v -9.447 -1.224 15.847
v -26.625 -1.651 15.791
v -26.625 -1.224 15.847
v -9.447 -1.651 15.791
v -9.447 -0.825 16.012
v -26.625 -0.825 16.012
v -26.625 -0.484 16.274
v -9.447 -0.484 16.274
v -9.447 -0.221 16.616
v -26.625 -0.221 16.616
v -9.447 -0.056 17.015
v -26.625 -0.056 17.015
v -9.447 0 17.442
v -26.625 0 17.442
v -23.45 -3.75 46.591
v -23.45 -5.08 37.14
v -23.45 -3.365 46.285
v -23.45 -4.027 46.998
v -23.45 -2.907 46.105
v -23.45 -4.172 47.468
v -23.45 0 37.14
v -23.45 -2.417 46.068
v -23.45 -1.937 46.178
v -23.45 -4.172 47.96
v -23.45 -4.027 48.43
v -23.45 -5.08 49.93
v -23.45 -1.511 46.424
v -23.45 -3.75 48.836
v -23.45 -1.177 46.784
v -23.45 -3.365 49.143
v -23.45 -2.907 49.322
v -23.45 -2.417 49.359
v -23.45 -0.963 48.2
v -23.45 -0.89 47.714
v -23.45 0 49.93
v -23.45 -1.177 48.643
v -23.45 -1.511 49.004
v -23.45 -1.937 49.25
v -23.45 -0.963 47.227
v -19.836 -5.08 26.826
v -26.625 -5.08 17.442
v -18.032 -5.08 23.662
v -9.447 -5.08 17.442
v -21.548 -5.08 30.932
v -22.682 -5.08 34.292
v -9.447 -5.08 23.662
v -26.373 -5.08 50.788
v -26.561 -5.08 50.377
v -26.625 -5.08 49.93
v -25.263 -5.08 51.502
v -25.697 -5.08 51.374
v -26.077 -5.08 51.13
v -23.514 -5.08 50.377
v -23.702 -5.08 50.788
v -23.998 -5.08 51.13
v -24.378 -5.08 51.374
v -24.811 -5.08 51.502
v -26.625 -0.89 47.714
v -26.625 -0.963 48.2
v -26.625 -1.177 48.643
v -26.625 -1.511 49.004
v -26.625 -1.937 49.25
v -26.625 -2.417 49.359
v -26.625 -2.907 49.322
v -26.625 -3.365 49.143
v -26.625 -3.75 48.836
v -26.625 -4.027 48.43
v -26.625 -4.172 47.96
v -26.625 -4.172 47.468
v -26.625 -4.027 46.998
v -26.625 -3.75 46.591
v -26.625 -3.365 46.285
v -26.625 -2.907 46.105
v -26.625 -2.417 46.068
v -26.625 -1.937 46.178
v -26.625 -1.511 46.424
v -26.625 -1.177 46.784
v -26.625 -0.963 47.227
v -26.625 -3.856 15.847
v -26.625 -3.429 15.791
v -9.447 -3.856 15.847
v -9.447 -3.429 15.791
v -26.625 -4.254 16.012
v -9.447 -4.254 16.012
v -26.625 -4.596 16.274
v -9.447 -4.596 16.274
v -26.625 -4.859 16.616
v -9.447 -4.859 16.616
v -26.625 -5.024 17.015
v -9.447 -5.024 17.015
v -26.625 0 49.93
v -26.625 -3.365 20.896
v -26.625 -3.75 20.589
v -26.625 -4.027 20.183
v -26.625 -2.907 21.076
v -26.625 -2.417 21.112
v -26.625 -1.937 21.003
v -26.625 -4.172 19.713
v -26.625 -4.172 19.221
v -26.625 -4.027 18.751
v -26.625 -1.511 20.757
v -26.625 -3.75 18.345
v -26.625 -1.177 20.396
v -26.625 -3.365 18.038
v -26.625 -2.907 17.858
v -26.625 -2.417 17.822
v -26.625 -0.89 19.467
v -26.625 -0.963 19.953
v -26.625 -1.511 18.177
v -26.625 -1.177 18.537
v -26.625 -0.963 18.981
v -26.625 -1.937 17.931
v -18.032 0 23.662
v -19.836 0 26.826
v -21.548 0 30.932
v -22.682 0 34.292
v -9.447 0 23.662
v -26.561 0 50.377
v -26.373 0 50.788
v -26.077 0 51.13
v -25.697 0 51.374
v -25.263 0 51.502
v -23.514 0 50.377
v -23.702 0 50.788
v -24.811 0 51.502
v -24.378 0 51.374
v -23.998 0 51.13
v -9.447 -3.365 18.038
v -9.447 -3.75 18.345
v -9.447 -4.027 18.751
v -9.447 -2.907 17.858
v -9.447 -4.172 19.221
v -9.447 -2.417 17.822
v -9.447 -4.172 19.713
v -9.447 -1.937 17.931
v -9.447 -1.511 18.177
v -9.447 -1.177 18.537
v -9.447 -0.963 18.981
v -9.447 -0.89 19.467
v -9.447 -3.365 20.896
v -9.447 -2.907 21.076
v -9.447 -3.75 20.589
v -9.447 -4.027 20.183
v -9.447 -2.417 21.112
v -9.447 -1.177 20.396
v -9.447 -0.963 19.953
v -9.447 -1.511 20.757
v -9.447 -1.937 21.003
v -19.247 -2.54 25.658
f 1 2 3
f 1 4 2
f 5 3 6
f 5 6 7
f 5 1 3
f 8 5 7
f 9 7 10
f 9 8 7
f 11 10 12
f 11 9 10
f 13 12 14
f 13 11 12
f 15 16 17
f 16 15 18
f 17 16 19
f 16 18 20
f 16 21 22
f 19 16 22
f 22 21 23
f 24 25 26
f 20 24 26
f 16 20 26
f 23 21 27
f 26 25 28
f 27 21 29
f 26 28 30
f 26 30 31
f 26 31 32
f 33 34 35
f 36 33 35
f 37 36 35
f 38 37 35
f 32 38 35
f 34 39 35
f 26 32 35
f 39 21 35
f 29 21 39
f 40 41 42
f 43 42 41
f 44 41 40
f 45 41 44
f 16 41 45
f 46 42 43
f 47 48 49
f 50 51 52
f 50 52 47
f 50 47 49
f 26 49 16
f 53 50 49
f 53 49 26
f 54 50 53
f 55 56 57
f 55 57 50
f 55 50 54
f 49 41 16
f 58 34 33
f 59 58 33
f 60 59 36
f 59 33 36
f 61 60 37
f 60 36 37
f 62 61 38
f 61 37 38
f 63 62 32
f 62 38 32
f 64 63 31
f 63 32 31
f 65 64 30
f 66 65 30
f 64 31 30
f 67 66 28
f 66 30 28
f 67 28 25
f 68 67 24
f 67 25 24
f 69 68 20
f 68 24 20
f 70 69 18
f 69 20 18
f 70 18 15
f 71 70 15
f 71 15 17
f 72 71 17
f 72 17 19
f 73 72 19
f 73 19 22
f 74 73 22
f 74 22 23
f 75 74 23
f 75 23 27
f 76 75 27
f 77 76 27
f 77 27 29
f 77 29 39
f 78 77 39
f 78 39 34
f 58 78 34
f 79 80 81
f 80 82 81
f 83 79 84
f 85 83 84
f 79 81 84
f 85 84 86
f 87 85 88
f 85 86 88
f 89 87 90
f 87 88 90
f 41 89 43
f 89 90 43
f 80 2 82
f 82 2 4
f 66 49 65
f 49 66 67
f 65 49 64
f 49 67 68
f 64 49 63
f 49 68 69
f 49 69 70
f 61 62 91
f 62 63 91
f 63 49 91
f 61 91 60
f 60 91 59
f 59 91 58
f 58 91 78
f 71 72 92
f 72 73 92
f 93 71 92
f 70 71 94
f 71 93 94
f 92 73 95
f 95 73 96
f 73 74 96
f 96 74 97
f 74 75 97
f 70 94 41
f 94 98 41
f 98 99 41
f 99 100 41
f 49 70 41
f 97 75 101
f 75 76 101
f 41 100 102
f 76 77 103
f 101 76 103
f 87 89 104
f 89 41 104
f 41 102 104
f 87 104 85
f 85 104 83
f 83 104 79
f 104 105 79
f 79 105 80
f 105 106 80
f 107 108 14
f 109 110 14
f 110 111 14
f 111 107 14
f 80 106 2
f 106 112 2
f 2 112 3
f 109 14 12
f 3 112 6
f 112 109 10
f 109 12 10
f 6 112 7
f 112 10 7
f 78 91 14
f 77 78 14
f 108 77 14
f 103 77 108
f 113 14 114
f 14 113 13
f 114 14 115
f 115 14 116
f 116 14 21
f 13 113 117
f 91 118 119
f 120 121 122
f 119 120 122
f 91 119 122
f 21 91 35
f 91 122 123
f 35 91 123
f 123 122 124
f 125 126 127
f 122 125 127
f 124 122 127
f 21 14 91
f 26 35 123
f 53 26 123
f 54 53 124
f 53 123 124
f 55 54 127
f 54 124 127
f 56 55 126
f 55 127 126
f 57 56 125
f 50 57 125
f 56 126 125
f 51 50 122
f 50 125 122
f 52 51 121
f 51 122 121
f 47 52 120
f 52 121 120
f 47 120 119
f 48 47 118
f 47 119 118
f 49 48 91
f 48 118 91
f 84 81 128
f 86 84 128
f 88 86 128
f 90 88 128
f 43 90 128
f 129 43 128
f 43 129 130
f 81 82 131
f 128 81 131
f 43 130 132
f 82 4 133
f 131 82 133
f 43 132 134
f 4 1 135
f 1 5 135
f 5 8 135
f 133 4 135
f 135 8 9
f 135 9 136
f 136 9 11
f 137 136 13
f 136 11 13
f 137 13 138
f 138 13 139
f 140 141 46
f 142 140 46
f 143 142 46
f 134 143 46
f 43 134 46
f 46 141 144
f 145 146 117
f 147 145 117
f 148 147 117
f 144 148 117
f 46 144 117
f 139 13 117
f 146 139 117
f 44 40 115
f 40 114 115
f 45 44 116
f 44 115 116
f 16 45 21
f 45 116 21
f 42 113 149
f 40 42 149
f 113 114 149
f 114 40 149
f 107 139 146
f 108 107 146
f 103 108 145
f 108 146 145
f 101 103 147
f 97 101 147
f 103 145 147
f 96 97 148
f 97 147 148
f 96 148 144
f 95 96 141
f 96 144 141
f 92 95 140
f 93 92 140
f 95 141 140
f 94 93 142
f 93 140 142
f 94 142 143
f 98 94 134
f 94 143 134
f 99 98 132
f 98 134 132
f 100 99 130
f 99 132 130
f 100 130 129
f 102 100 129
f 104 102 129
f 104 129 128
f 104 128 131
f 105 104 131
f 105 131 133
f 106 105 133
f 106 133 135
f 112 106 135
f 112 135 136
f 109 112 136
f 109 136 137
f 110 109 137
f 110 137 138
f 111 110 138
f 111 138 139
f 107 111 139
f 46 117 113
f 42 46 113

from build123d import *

# Parameters (mm, degrees)
F1_DEPTH = 5.08
F2_R     = 1.651
F4_D     = 3.3


with BuildPart() as f1:
    # F0 (on Front) → F1 (new body)
    with BuildSketch(Plane.XZ):
        with BuildLine():
            Line((-26.6248177087, 44.2240222495), (-26.6248177087, 37.1401777957))
            Line((-26.6248177087, 37.1401777957), (-26.6248177087, 15.790813717))
            Line((-26.6248177087, 15.790813717), (-18.0322819572, 15.790813717))
            Line((-18.0322819572, 15.790813717), (-9.4473101199, 15.790813717))
            Line((-9.4473101199, 15.790813717), (-9.4473101199, 23.6617988805))
            Line((-9.4473101199, 23.6617988805), (-16.3273841628, 23.6617988805))
            add(Edge.make_bspline(
                [(-16.3273841628, 23.6617988805), (-16.2021531976, 23.1573319897), (-16.1372444387, 22.7565283285), (-16.1473177087, 22.4913693964)],
                knots=[0.9536770063, 0.9536770063, 0.9536770063, 0.9536770063, 1, 1, 1, 1], degree=3))
            add(Edge.make_bspline(
                [(-16.1473177087, 22.4913693964), (-16.1800367938, 21.6301041251), (-17.0038324761, 22.1999200382), (-18.0322819572, 23.6617988805)],
                knots=[0, 0, 0, 0, 0.1504621604, 0.1504621604, 0.1504621604, 0.1504621604], degree=3))
            add(Edge.make_bspline(
                [(-18.0322819572, 23.6617988805), (-18.4185584968, 24.2108676593), (-20.6372456091, 27.8178237541), (-22.7930713687, 34.2033705284), (-23.4498177087, 37.1401777957)],
                knots=[0.1504621604, 0.1504621604, 0.1504621604, 0.1504621604, 0.2069744186, 0.4524830891, 0.4524830891, 0.4524830891, 0.4524830891], degree=3))
            add(Edge.make_bspline(
                [(-23.4498177087, 37.1401777957), (-23.7877118735, 38.6511569639), (-23.8355675171, 39.5655078846), (-23.4498177087, 39.3262133002)],
                knots=[0.4524830891, 0.4524830891, 0.4524830891, 0.4524830891, 0.578796617, 0.578796617, 0.578796617, 0.578796617], degree=3))
            Line((-23.4498177087, 39.3262133002), (-23.4498177087, 44.2240222495))
            Line((-23.4498177087, 44.2240222495), (-23.4498177087, 49.9301888049))
            ThreePointArc((-23.4498177087, 49.9301888049), (-25.0373177087, 51.5176888049), (-26.6248177087, 49.9301888049))
            Line((-26.6248177087, 49.9301888049), (-26.6248177087, 44.2240222495))
        make_face()
        with BuildLine():
            Line((-23.4498177087, 37.1401777957), (-23.4498177087, 39.3262133002))
            add(Edge.make_bspline(
                [(-23.4498177087, 37.1401777957), (-23.7877118735, 38.6511569639), (-23.8355675171, 39.5655078846), (-23.4498177087, 39.3262133002)],
                knots=[0.4524830891, 0.4524830891, 0.4524830891, 0.4524830891, 0.578796617, 0.578796617, 0.578796617, 0.578796617], degree=3))
        make_face()
        with BuildLine():
            add(Edge.make_bspline(
                [(-16.3273841628, 23.6617988805), (-16.2021531976, 23.1573319897), (-16.1372444387, 22.7565283285), (-16.1473177087, 22.4913693964)],
                knots=[0.9536770063, 0.9536770063, 0.9536770063, 0.9536770063, 1, 1, 1, 1], degree=3))
            Line((-16.3273841628, 23.6617988805), (-18.0322819572, 23.6617988805))
            add(Edge.make_bspline(
                [(-16.1473177087, 22.4913693964), (-16.1800367938, 21.6301041251), (-17.0038324761, 22.1999200382), (-18.0322819572, 23.6617988805)],
                knots=[0, 0, 0, 0, 0.1504621604, 0.1504621604, 0.1504621604, 0.1504621604], degree=3))
        make_face()
    extrude(amount=F1_DEPTH)

    # F2
    f2_edges = [f1.edges().sort_by_distance(p)[0] for p in [
        (-18.036064, -5.08, 15.790814),
        (-18.036064, 0, 15.790814),
    ]]
    fillet(f2_edges, radius=F2_R)

    # F4 (through all)
    with Locations(Plane(origin=(-26.6248177087, 0, 0), x_dir=(0, -1, 0), z_dir=(-1, 0, 0))):
        with Locations((2.54, 47.7136392146), (2.54, 19.4669695918)):
            Hole(F4_D / 2)


solid = f1.part
